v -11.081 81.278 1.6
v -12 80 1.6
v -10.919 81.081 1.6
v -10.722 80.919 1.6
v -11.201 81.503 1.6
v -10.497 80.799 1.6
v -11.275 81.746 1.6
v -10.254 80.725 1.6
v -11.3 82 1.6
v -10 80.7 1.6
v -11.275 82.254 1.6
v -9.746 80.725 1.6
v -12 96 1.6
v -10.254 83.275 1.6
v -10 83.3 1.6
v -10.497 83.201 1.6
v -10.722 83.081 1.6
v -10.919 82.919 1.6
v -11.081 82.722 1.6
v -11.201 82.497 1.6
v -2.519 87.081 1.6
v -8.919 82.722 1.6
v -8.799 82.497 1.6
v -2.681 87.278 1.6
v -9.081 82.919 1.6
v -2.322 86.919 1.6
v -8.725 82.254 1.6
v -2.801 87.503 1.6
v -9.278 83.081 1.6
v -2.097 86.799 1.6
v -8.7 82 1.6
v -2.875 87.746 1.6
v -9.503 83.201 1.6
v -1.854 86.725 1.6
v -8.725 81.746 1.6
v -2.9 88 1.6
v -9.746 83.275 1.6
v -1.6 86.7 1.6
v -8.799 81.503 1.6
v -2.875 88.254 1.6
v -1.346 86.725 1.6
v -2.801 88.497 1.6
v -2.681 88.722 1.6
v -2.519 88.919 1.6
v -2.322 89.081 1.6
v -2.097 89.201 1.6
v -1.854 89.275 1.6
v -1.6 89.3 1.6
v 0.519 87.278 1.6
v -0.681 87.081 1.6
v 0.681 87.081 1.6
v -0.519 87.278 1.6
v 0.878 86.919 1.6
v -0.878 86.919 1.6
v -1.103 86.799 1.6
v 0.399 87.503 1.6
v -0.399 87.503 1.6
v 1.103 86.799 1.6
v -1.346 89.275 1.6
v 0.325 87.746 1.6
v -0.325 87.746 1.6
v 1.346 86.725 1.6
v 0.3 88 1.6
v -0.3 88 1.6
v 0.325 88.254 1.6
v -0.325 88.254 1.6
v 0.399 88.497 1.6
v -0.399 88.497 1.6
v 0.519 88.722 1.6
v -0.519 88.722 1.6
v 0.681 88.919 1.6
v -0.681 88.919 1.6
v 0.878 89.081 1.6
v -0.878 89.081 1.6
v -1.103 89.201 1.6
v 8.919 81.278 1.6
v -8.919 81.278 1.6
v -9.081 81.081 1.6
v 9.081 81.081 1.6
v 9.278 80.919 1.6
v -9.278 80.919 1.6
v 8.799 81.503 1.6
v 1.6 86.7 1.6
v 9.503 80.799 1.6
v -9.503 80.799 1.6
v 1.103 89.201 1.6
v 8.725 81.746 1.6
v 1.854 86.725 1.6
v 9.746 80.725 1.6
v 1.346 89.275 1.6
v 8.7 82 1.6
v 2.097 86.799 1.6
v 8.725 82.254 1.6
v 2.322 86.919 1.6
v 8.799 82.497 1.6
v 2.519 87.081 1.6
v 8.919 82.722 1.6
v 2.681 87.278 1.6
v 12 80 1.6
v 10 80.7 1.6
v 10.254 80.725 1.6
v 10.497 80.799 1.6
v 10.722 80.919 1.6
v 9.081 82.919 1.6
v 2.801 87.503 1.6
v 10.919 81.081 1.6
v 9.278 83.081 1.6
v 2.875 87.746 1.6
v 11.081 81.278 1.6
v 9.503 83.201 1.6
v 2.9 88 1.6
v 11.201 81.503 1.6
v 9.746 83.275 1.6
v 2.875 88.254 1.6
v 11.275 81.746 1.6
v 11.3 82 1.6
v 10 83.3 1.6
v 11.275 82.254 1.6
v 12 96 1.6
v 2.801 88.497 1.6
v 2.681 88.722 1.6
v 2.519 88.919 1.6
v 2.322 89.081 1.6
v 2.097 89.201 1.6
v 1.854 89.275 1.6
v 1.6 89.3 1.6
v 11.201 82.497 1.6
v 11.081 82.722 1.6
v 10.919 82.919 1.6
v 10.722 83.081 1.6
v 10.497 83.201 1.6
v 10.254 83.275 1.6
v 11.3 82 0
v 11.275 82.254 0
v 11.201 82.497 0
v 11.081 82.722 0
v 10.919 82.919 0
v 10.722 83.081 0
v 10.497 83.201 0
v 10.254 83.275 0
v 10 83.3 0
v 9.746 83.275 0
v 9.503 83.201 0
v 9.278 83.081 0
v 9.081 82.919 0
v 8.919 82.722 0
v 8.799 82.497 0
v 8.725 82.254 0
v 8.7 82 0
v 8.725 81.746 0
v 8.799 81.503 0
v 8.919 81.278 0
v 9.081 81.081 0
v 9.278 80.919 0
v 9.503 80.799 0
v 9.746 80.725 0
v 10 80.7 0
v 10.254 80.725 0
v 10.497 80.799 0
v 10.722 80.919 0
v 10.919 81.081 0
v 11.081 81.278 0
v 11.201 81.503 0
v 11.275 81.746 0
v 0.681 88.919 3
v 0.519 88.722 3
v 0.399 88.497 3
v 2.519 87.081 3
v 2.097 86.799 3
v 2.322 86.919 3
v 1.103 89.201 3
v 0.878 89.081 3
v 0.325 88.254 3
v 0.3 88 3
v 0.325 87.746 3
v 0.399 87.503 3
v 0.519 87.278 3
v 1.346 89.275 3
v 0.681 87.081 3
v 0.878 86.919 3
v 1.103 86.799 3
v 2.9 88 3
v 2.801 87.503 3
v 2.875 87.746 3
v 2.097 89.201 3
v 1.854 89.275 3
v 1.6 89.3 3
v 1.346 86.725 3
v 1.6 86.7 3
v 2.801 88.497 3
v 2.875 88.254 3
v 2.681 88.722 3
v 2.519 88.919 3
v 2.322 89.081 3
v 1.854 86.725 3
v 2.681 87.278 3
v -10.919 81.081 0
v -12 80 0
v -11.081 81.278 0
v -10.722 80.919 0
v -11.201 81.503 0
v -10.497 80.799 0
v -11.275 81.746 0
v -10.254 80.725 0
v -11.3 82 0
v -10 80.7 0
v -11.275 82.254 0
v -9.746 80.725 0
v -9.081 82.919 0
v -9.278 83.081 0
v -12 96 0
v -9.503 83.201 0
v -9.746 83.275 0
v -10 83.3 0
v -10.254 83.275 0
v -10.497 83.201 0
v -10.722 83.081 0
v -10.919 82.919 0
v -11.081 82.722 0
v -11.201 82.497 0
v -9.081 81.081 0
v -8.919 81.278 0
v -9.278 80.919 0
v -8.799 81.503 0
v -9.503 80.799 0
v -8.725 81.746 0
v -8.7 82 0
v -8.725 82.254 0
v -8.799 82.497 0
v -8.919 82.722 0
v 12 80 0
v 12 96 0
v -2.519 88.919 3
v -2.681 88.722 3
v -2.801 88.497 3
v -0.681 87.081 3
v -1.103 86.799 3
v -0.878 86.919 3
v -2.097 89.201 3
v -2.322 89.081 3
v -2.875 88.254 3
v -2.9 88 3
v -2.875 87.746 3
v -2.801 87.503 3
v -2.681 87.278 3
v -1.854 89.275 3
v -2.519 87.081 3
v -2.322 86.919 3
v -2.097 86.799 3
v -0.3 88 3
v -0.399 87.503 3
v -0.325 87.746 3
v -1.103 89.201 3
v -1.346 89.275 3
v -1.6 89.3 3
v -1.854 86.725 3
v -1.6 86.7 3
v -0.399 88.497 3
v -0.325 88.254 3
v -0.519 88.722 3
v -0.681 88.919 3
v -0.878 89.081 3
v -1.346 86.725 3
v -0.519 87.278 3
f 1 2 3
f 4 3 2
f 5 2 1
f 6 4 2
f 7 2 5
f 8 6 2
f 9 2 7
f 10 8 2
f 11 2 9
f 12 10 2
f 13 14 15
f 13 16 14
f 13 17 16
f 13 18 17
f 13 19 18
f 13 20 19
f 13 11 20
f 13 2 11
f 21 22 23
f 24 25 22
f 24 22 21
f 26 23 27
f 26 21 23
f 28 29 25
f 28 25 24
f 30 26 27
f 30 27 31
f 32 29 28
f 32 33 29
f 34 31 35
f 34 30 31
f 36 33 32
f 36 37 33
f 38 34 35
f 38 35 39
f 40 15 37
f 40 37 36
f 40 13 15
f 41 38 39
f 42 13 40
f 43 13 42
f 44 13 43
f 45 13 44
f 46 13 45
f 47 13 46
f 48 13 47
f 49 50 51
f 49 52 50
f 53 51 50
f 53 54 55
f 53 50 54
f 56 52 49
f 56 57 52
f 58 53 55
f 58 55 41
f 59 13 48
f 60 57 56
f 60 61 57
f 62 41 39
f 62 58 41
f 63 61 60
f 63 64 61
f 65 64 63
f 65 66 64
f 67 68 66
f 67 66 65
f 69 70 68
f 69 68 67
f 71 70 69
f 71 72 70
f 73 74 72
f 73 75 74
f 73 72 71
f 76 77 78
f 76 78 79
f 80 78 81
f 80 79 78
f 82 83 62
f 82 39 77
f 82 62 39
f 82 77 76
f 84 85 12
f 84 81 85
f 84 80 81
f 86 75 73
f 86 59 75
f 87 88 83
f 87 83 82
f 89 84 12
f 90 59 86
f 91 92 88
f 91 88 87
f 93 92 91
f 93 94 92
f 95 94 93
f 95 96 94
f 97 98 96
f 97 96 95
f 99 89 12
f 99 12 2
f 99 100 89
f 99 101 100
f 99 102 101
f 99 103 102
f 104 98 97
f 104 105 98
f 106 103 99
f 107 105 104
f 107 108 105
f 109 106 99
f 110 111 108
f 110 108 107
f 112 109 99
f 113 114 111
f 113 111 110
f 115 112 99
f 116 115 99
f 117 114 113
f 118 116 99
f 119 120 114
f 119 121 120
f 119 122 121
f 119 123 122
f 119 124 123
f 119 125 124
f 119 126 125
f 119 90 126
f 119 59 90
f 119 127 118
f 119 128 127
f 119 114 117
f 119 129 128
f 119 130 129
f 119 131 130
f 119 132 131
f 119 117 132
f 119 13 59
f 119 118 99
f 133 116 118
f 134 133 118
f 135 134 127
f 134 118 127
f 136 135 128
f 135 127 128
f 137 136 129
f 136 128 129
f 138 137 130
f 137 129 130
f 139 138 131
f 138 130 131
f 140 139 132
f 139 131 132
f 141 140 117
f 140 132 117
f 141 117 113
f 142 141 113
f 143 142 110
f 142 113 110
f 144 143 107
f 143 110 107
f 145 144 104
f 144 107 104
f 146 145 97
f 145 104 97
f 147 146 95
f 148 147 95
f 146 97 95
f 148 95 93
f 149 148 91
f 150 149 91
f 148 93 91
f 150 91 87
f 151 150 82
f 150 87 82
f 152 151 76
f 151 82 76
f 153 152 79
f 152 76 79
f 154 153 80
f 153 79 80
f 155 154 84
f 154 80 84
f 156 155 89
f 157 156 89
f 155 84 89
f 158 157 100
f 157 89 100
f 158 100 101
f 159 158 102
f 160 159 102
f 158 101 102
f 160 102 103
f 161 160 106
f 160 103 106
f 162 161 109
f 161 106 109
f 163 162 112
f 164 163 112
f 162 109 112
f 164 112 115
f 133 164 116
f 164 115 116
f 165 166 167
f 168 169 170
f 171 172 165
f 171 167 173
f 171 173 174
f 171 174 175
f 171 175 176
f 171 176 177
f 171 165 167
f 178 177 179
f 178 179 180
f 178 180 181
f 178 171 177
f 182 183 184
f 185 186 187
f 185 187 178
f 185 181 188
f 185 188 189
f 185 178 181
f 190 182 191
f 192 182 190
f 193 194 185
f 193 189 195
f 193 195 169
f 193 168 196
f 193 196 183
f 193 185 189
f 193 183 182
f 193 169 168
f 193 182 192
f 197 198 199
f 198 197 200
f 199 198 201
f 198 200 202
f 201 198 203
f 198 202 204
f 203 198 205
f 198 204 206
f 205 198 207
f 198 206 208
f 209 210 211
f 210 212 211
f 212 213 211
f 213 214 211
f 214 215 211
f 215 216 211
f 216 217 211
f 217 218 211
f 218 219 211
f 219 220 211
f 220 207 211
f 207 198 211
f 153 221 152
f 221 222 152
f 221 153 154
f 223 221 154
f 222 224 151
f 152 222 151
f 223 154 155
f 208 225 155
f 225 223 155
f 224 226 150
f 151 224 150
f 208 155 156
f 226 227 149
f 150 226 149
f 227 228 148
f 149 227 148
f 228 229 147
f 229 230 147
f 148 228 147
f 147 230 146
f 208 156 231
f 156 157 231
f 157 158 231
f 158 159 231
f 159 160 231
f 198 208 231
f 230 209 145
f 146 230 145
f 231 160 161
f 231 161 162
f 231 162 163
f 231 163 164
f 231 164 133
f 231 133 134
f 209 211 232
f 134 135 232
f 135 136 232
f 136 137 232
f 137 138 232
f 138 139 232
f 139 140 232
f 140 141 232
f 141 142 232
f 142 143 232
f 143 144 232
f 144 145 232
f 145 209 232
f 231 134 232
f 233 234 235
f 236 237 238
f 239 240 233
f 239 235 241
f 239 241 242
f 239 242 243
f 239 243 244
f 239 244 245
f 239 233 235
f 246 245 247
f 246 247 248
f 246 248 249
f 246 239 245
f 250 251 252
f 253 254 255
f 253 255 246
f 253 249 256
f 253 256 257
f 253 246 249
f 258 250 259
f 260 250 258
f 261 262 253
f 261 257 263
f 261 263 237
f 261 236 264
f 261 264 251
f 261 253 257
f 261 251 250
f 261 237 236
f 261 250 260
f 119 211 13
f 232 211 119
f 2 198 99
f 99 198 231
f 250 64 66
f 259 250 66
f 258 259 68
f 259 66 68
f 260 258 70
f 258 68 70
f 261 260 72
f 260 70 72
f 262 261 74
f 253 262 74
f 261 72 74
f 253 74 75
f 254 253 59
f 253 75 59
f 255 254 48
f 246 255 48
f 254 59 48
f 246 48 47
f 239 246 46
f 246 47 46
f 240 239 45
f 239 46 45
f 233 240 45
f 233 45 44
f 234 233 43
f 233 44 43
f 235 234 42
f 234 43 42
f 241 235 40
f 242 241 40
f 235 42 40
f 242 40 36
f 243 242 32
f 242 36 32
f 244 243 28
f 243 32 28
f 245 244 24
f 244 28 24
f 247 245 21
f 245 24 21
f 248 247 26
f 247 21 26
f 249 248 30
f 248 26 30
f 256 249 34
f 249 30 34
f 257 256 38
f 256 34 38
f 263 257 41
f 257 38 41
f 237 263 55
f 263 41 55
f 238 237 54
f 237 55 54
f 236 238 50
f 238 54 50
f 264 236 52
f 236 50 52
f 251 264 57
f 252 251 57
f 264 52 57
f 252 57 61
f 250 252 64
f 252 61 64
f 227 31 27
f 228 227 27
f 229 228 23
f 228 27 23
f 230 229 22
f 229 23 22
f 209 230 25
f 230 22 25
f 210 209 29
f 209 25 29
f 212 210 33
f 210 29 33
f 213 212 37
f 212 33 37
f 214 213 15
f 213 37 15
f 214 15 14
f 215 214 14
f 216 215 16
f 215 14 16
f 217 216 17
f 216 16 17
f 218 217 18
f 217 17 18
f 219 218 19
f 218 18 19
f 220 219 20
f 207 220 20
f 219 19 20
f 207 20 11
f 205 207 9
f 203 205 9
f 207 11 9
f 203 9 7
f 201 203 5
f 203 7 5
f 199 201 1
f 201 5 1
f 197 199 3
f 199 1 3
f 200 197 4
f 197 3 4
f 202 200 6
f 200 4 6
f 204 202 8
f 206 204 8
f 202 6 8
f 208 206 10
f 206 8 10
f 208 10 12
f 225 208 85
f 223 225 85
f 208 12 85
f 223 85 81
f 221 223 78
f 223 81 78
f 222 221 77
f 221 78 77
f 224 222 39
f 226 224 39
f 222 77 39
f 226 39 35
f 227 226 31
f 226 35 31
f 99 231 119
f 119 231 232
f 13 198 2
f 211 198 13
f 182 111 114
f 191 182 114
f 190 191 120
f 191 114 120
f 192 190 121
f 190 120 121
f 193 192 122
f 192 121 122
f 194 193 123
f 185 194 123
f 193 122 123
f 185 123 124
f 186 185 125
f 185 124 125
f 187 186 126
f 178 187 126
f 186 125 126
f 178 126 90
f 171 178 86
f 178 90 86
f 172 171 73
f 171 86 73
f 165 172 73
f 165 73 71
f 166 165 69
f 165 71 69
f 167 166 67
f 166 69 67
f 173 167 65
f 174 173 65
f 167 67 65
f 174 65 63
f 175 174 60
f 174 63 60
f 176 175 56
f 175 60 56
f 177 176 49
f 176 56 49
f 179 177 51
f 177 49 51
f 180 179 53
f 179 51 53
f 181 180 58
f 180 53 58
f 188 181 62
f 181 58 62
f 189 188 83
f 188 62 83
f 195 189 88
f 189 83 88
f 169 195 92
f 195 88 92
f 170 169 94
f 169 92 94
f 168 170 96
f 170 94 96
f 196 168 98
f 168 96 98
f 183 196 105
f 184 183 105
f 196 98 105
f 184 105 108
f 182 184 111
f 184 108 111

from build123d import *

# Parameters (mm, degrees)
SKETCH_3_W                                  = 24
SKETCH_3_H                                  = 16
V10_TOF_CANDIDATE_CARRIER24X16_DEPTH        = 1.6
V10_TOF_OPTICAL_PACKAGES_FACING_FRONT_START = 1.6
SKETCH_4_R                                  = 1.3
V10_TOF_OPTICAL_PACKAGES_FACING_FRONT_DEPTH = 1.4
SKETCH_5_R                                  = 1.3
V10_TOF_TWO_CANDIDATE_HOLES20MM_DEPTH       = 1.6


with BuildPart() as part:
    # 草图3 → V10_TOF_candidate_carrier24x16 (new body)
    with BuildSketch(Plane.XY):
        with Locations((0, 88)):
            Rectangle(SKETCH_3_W, SKETCH_3_H)
    extrude(amount=V10_TOF_CANDIDATE_CARRIER24X16_DEPTH)

    # 草图4 → V10_TOF_optical_packages_facing_front (add)
    with BuildSketch(Plane.XY.offset(V10_TOF_OPTICAL_PACKAGES_FACING_FRONT_START)):
        with Locations((-1.6, 88)):
            Circle(SKETCH_4_R)
        with Locations((1.6, 88)):
            Circle(SKETCH_4_R)
    extrude(amount=V10_TOF_OPTICAL_PACKAGES_FACING_FRONT_DEPTH)

    # 草图5 → V10_TOF_two_candidate_holes20mm (cut)
    with BuildSketch(Plane.XY.offset(1.6)):
        with Locations((-10, 82)):
            Circle(SKETCH_5_R)
        with Locations((10, 82)):
            Circle(SKETCH_5_R)
    extrude(amount=-V10_TOF_TWO_CANDIDATE_HOLES20MM_DEPTH, mode=Mode.SUBTRACT)


solid = part.part
